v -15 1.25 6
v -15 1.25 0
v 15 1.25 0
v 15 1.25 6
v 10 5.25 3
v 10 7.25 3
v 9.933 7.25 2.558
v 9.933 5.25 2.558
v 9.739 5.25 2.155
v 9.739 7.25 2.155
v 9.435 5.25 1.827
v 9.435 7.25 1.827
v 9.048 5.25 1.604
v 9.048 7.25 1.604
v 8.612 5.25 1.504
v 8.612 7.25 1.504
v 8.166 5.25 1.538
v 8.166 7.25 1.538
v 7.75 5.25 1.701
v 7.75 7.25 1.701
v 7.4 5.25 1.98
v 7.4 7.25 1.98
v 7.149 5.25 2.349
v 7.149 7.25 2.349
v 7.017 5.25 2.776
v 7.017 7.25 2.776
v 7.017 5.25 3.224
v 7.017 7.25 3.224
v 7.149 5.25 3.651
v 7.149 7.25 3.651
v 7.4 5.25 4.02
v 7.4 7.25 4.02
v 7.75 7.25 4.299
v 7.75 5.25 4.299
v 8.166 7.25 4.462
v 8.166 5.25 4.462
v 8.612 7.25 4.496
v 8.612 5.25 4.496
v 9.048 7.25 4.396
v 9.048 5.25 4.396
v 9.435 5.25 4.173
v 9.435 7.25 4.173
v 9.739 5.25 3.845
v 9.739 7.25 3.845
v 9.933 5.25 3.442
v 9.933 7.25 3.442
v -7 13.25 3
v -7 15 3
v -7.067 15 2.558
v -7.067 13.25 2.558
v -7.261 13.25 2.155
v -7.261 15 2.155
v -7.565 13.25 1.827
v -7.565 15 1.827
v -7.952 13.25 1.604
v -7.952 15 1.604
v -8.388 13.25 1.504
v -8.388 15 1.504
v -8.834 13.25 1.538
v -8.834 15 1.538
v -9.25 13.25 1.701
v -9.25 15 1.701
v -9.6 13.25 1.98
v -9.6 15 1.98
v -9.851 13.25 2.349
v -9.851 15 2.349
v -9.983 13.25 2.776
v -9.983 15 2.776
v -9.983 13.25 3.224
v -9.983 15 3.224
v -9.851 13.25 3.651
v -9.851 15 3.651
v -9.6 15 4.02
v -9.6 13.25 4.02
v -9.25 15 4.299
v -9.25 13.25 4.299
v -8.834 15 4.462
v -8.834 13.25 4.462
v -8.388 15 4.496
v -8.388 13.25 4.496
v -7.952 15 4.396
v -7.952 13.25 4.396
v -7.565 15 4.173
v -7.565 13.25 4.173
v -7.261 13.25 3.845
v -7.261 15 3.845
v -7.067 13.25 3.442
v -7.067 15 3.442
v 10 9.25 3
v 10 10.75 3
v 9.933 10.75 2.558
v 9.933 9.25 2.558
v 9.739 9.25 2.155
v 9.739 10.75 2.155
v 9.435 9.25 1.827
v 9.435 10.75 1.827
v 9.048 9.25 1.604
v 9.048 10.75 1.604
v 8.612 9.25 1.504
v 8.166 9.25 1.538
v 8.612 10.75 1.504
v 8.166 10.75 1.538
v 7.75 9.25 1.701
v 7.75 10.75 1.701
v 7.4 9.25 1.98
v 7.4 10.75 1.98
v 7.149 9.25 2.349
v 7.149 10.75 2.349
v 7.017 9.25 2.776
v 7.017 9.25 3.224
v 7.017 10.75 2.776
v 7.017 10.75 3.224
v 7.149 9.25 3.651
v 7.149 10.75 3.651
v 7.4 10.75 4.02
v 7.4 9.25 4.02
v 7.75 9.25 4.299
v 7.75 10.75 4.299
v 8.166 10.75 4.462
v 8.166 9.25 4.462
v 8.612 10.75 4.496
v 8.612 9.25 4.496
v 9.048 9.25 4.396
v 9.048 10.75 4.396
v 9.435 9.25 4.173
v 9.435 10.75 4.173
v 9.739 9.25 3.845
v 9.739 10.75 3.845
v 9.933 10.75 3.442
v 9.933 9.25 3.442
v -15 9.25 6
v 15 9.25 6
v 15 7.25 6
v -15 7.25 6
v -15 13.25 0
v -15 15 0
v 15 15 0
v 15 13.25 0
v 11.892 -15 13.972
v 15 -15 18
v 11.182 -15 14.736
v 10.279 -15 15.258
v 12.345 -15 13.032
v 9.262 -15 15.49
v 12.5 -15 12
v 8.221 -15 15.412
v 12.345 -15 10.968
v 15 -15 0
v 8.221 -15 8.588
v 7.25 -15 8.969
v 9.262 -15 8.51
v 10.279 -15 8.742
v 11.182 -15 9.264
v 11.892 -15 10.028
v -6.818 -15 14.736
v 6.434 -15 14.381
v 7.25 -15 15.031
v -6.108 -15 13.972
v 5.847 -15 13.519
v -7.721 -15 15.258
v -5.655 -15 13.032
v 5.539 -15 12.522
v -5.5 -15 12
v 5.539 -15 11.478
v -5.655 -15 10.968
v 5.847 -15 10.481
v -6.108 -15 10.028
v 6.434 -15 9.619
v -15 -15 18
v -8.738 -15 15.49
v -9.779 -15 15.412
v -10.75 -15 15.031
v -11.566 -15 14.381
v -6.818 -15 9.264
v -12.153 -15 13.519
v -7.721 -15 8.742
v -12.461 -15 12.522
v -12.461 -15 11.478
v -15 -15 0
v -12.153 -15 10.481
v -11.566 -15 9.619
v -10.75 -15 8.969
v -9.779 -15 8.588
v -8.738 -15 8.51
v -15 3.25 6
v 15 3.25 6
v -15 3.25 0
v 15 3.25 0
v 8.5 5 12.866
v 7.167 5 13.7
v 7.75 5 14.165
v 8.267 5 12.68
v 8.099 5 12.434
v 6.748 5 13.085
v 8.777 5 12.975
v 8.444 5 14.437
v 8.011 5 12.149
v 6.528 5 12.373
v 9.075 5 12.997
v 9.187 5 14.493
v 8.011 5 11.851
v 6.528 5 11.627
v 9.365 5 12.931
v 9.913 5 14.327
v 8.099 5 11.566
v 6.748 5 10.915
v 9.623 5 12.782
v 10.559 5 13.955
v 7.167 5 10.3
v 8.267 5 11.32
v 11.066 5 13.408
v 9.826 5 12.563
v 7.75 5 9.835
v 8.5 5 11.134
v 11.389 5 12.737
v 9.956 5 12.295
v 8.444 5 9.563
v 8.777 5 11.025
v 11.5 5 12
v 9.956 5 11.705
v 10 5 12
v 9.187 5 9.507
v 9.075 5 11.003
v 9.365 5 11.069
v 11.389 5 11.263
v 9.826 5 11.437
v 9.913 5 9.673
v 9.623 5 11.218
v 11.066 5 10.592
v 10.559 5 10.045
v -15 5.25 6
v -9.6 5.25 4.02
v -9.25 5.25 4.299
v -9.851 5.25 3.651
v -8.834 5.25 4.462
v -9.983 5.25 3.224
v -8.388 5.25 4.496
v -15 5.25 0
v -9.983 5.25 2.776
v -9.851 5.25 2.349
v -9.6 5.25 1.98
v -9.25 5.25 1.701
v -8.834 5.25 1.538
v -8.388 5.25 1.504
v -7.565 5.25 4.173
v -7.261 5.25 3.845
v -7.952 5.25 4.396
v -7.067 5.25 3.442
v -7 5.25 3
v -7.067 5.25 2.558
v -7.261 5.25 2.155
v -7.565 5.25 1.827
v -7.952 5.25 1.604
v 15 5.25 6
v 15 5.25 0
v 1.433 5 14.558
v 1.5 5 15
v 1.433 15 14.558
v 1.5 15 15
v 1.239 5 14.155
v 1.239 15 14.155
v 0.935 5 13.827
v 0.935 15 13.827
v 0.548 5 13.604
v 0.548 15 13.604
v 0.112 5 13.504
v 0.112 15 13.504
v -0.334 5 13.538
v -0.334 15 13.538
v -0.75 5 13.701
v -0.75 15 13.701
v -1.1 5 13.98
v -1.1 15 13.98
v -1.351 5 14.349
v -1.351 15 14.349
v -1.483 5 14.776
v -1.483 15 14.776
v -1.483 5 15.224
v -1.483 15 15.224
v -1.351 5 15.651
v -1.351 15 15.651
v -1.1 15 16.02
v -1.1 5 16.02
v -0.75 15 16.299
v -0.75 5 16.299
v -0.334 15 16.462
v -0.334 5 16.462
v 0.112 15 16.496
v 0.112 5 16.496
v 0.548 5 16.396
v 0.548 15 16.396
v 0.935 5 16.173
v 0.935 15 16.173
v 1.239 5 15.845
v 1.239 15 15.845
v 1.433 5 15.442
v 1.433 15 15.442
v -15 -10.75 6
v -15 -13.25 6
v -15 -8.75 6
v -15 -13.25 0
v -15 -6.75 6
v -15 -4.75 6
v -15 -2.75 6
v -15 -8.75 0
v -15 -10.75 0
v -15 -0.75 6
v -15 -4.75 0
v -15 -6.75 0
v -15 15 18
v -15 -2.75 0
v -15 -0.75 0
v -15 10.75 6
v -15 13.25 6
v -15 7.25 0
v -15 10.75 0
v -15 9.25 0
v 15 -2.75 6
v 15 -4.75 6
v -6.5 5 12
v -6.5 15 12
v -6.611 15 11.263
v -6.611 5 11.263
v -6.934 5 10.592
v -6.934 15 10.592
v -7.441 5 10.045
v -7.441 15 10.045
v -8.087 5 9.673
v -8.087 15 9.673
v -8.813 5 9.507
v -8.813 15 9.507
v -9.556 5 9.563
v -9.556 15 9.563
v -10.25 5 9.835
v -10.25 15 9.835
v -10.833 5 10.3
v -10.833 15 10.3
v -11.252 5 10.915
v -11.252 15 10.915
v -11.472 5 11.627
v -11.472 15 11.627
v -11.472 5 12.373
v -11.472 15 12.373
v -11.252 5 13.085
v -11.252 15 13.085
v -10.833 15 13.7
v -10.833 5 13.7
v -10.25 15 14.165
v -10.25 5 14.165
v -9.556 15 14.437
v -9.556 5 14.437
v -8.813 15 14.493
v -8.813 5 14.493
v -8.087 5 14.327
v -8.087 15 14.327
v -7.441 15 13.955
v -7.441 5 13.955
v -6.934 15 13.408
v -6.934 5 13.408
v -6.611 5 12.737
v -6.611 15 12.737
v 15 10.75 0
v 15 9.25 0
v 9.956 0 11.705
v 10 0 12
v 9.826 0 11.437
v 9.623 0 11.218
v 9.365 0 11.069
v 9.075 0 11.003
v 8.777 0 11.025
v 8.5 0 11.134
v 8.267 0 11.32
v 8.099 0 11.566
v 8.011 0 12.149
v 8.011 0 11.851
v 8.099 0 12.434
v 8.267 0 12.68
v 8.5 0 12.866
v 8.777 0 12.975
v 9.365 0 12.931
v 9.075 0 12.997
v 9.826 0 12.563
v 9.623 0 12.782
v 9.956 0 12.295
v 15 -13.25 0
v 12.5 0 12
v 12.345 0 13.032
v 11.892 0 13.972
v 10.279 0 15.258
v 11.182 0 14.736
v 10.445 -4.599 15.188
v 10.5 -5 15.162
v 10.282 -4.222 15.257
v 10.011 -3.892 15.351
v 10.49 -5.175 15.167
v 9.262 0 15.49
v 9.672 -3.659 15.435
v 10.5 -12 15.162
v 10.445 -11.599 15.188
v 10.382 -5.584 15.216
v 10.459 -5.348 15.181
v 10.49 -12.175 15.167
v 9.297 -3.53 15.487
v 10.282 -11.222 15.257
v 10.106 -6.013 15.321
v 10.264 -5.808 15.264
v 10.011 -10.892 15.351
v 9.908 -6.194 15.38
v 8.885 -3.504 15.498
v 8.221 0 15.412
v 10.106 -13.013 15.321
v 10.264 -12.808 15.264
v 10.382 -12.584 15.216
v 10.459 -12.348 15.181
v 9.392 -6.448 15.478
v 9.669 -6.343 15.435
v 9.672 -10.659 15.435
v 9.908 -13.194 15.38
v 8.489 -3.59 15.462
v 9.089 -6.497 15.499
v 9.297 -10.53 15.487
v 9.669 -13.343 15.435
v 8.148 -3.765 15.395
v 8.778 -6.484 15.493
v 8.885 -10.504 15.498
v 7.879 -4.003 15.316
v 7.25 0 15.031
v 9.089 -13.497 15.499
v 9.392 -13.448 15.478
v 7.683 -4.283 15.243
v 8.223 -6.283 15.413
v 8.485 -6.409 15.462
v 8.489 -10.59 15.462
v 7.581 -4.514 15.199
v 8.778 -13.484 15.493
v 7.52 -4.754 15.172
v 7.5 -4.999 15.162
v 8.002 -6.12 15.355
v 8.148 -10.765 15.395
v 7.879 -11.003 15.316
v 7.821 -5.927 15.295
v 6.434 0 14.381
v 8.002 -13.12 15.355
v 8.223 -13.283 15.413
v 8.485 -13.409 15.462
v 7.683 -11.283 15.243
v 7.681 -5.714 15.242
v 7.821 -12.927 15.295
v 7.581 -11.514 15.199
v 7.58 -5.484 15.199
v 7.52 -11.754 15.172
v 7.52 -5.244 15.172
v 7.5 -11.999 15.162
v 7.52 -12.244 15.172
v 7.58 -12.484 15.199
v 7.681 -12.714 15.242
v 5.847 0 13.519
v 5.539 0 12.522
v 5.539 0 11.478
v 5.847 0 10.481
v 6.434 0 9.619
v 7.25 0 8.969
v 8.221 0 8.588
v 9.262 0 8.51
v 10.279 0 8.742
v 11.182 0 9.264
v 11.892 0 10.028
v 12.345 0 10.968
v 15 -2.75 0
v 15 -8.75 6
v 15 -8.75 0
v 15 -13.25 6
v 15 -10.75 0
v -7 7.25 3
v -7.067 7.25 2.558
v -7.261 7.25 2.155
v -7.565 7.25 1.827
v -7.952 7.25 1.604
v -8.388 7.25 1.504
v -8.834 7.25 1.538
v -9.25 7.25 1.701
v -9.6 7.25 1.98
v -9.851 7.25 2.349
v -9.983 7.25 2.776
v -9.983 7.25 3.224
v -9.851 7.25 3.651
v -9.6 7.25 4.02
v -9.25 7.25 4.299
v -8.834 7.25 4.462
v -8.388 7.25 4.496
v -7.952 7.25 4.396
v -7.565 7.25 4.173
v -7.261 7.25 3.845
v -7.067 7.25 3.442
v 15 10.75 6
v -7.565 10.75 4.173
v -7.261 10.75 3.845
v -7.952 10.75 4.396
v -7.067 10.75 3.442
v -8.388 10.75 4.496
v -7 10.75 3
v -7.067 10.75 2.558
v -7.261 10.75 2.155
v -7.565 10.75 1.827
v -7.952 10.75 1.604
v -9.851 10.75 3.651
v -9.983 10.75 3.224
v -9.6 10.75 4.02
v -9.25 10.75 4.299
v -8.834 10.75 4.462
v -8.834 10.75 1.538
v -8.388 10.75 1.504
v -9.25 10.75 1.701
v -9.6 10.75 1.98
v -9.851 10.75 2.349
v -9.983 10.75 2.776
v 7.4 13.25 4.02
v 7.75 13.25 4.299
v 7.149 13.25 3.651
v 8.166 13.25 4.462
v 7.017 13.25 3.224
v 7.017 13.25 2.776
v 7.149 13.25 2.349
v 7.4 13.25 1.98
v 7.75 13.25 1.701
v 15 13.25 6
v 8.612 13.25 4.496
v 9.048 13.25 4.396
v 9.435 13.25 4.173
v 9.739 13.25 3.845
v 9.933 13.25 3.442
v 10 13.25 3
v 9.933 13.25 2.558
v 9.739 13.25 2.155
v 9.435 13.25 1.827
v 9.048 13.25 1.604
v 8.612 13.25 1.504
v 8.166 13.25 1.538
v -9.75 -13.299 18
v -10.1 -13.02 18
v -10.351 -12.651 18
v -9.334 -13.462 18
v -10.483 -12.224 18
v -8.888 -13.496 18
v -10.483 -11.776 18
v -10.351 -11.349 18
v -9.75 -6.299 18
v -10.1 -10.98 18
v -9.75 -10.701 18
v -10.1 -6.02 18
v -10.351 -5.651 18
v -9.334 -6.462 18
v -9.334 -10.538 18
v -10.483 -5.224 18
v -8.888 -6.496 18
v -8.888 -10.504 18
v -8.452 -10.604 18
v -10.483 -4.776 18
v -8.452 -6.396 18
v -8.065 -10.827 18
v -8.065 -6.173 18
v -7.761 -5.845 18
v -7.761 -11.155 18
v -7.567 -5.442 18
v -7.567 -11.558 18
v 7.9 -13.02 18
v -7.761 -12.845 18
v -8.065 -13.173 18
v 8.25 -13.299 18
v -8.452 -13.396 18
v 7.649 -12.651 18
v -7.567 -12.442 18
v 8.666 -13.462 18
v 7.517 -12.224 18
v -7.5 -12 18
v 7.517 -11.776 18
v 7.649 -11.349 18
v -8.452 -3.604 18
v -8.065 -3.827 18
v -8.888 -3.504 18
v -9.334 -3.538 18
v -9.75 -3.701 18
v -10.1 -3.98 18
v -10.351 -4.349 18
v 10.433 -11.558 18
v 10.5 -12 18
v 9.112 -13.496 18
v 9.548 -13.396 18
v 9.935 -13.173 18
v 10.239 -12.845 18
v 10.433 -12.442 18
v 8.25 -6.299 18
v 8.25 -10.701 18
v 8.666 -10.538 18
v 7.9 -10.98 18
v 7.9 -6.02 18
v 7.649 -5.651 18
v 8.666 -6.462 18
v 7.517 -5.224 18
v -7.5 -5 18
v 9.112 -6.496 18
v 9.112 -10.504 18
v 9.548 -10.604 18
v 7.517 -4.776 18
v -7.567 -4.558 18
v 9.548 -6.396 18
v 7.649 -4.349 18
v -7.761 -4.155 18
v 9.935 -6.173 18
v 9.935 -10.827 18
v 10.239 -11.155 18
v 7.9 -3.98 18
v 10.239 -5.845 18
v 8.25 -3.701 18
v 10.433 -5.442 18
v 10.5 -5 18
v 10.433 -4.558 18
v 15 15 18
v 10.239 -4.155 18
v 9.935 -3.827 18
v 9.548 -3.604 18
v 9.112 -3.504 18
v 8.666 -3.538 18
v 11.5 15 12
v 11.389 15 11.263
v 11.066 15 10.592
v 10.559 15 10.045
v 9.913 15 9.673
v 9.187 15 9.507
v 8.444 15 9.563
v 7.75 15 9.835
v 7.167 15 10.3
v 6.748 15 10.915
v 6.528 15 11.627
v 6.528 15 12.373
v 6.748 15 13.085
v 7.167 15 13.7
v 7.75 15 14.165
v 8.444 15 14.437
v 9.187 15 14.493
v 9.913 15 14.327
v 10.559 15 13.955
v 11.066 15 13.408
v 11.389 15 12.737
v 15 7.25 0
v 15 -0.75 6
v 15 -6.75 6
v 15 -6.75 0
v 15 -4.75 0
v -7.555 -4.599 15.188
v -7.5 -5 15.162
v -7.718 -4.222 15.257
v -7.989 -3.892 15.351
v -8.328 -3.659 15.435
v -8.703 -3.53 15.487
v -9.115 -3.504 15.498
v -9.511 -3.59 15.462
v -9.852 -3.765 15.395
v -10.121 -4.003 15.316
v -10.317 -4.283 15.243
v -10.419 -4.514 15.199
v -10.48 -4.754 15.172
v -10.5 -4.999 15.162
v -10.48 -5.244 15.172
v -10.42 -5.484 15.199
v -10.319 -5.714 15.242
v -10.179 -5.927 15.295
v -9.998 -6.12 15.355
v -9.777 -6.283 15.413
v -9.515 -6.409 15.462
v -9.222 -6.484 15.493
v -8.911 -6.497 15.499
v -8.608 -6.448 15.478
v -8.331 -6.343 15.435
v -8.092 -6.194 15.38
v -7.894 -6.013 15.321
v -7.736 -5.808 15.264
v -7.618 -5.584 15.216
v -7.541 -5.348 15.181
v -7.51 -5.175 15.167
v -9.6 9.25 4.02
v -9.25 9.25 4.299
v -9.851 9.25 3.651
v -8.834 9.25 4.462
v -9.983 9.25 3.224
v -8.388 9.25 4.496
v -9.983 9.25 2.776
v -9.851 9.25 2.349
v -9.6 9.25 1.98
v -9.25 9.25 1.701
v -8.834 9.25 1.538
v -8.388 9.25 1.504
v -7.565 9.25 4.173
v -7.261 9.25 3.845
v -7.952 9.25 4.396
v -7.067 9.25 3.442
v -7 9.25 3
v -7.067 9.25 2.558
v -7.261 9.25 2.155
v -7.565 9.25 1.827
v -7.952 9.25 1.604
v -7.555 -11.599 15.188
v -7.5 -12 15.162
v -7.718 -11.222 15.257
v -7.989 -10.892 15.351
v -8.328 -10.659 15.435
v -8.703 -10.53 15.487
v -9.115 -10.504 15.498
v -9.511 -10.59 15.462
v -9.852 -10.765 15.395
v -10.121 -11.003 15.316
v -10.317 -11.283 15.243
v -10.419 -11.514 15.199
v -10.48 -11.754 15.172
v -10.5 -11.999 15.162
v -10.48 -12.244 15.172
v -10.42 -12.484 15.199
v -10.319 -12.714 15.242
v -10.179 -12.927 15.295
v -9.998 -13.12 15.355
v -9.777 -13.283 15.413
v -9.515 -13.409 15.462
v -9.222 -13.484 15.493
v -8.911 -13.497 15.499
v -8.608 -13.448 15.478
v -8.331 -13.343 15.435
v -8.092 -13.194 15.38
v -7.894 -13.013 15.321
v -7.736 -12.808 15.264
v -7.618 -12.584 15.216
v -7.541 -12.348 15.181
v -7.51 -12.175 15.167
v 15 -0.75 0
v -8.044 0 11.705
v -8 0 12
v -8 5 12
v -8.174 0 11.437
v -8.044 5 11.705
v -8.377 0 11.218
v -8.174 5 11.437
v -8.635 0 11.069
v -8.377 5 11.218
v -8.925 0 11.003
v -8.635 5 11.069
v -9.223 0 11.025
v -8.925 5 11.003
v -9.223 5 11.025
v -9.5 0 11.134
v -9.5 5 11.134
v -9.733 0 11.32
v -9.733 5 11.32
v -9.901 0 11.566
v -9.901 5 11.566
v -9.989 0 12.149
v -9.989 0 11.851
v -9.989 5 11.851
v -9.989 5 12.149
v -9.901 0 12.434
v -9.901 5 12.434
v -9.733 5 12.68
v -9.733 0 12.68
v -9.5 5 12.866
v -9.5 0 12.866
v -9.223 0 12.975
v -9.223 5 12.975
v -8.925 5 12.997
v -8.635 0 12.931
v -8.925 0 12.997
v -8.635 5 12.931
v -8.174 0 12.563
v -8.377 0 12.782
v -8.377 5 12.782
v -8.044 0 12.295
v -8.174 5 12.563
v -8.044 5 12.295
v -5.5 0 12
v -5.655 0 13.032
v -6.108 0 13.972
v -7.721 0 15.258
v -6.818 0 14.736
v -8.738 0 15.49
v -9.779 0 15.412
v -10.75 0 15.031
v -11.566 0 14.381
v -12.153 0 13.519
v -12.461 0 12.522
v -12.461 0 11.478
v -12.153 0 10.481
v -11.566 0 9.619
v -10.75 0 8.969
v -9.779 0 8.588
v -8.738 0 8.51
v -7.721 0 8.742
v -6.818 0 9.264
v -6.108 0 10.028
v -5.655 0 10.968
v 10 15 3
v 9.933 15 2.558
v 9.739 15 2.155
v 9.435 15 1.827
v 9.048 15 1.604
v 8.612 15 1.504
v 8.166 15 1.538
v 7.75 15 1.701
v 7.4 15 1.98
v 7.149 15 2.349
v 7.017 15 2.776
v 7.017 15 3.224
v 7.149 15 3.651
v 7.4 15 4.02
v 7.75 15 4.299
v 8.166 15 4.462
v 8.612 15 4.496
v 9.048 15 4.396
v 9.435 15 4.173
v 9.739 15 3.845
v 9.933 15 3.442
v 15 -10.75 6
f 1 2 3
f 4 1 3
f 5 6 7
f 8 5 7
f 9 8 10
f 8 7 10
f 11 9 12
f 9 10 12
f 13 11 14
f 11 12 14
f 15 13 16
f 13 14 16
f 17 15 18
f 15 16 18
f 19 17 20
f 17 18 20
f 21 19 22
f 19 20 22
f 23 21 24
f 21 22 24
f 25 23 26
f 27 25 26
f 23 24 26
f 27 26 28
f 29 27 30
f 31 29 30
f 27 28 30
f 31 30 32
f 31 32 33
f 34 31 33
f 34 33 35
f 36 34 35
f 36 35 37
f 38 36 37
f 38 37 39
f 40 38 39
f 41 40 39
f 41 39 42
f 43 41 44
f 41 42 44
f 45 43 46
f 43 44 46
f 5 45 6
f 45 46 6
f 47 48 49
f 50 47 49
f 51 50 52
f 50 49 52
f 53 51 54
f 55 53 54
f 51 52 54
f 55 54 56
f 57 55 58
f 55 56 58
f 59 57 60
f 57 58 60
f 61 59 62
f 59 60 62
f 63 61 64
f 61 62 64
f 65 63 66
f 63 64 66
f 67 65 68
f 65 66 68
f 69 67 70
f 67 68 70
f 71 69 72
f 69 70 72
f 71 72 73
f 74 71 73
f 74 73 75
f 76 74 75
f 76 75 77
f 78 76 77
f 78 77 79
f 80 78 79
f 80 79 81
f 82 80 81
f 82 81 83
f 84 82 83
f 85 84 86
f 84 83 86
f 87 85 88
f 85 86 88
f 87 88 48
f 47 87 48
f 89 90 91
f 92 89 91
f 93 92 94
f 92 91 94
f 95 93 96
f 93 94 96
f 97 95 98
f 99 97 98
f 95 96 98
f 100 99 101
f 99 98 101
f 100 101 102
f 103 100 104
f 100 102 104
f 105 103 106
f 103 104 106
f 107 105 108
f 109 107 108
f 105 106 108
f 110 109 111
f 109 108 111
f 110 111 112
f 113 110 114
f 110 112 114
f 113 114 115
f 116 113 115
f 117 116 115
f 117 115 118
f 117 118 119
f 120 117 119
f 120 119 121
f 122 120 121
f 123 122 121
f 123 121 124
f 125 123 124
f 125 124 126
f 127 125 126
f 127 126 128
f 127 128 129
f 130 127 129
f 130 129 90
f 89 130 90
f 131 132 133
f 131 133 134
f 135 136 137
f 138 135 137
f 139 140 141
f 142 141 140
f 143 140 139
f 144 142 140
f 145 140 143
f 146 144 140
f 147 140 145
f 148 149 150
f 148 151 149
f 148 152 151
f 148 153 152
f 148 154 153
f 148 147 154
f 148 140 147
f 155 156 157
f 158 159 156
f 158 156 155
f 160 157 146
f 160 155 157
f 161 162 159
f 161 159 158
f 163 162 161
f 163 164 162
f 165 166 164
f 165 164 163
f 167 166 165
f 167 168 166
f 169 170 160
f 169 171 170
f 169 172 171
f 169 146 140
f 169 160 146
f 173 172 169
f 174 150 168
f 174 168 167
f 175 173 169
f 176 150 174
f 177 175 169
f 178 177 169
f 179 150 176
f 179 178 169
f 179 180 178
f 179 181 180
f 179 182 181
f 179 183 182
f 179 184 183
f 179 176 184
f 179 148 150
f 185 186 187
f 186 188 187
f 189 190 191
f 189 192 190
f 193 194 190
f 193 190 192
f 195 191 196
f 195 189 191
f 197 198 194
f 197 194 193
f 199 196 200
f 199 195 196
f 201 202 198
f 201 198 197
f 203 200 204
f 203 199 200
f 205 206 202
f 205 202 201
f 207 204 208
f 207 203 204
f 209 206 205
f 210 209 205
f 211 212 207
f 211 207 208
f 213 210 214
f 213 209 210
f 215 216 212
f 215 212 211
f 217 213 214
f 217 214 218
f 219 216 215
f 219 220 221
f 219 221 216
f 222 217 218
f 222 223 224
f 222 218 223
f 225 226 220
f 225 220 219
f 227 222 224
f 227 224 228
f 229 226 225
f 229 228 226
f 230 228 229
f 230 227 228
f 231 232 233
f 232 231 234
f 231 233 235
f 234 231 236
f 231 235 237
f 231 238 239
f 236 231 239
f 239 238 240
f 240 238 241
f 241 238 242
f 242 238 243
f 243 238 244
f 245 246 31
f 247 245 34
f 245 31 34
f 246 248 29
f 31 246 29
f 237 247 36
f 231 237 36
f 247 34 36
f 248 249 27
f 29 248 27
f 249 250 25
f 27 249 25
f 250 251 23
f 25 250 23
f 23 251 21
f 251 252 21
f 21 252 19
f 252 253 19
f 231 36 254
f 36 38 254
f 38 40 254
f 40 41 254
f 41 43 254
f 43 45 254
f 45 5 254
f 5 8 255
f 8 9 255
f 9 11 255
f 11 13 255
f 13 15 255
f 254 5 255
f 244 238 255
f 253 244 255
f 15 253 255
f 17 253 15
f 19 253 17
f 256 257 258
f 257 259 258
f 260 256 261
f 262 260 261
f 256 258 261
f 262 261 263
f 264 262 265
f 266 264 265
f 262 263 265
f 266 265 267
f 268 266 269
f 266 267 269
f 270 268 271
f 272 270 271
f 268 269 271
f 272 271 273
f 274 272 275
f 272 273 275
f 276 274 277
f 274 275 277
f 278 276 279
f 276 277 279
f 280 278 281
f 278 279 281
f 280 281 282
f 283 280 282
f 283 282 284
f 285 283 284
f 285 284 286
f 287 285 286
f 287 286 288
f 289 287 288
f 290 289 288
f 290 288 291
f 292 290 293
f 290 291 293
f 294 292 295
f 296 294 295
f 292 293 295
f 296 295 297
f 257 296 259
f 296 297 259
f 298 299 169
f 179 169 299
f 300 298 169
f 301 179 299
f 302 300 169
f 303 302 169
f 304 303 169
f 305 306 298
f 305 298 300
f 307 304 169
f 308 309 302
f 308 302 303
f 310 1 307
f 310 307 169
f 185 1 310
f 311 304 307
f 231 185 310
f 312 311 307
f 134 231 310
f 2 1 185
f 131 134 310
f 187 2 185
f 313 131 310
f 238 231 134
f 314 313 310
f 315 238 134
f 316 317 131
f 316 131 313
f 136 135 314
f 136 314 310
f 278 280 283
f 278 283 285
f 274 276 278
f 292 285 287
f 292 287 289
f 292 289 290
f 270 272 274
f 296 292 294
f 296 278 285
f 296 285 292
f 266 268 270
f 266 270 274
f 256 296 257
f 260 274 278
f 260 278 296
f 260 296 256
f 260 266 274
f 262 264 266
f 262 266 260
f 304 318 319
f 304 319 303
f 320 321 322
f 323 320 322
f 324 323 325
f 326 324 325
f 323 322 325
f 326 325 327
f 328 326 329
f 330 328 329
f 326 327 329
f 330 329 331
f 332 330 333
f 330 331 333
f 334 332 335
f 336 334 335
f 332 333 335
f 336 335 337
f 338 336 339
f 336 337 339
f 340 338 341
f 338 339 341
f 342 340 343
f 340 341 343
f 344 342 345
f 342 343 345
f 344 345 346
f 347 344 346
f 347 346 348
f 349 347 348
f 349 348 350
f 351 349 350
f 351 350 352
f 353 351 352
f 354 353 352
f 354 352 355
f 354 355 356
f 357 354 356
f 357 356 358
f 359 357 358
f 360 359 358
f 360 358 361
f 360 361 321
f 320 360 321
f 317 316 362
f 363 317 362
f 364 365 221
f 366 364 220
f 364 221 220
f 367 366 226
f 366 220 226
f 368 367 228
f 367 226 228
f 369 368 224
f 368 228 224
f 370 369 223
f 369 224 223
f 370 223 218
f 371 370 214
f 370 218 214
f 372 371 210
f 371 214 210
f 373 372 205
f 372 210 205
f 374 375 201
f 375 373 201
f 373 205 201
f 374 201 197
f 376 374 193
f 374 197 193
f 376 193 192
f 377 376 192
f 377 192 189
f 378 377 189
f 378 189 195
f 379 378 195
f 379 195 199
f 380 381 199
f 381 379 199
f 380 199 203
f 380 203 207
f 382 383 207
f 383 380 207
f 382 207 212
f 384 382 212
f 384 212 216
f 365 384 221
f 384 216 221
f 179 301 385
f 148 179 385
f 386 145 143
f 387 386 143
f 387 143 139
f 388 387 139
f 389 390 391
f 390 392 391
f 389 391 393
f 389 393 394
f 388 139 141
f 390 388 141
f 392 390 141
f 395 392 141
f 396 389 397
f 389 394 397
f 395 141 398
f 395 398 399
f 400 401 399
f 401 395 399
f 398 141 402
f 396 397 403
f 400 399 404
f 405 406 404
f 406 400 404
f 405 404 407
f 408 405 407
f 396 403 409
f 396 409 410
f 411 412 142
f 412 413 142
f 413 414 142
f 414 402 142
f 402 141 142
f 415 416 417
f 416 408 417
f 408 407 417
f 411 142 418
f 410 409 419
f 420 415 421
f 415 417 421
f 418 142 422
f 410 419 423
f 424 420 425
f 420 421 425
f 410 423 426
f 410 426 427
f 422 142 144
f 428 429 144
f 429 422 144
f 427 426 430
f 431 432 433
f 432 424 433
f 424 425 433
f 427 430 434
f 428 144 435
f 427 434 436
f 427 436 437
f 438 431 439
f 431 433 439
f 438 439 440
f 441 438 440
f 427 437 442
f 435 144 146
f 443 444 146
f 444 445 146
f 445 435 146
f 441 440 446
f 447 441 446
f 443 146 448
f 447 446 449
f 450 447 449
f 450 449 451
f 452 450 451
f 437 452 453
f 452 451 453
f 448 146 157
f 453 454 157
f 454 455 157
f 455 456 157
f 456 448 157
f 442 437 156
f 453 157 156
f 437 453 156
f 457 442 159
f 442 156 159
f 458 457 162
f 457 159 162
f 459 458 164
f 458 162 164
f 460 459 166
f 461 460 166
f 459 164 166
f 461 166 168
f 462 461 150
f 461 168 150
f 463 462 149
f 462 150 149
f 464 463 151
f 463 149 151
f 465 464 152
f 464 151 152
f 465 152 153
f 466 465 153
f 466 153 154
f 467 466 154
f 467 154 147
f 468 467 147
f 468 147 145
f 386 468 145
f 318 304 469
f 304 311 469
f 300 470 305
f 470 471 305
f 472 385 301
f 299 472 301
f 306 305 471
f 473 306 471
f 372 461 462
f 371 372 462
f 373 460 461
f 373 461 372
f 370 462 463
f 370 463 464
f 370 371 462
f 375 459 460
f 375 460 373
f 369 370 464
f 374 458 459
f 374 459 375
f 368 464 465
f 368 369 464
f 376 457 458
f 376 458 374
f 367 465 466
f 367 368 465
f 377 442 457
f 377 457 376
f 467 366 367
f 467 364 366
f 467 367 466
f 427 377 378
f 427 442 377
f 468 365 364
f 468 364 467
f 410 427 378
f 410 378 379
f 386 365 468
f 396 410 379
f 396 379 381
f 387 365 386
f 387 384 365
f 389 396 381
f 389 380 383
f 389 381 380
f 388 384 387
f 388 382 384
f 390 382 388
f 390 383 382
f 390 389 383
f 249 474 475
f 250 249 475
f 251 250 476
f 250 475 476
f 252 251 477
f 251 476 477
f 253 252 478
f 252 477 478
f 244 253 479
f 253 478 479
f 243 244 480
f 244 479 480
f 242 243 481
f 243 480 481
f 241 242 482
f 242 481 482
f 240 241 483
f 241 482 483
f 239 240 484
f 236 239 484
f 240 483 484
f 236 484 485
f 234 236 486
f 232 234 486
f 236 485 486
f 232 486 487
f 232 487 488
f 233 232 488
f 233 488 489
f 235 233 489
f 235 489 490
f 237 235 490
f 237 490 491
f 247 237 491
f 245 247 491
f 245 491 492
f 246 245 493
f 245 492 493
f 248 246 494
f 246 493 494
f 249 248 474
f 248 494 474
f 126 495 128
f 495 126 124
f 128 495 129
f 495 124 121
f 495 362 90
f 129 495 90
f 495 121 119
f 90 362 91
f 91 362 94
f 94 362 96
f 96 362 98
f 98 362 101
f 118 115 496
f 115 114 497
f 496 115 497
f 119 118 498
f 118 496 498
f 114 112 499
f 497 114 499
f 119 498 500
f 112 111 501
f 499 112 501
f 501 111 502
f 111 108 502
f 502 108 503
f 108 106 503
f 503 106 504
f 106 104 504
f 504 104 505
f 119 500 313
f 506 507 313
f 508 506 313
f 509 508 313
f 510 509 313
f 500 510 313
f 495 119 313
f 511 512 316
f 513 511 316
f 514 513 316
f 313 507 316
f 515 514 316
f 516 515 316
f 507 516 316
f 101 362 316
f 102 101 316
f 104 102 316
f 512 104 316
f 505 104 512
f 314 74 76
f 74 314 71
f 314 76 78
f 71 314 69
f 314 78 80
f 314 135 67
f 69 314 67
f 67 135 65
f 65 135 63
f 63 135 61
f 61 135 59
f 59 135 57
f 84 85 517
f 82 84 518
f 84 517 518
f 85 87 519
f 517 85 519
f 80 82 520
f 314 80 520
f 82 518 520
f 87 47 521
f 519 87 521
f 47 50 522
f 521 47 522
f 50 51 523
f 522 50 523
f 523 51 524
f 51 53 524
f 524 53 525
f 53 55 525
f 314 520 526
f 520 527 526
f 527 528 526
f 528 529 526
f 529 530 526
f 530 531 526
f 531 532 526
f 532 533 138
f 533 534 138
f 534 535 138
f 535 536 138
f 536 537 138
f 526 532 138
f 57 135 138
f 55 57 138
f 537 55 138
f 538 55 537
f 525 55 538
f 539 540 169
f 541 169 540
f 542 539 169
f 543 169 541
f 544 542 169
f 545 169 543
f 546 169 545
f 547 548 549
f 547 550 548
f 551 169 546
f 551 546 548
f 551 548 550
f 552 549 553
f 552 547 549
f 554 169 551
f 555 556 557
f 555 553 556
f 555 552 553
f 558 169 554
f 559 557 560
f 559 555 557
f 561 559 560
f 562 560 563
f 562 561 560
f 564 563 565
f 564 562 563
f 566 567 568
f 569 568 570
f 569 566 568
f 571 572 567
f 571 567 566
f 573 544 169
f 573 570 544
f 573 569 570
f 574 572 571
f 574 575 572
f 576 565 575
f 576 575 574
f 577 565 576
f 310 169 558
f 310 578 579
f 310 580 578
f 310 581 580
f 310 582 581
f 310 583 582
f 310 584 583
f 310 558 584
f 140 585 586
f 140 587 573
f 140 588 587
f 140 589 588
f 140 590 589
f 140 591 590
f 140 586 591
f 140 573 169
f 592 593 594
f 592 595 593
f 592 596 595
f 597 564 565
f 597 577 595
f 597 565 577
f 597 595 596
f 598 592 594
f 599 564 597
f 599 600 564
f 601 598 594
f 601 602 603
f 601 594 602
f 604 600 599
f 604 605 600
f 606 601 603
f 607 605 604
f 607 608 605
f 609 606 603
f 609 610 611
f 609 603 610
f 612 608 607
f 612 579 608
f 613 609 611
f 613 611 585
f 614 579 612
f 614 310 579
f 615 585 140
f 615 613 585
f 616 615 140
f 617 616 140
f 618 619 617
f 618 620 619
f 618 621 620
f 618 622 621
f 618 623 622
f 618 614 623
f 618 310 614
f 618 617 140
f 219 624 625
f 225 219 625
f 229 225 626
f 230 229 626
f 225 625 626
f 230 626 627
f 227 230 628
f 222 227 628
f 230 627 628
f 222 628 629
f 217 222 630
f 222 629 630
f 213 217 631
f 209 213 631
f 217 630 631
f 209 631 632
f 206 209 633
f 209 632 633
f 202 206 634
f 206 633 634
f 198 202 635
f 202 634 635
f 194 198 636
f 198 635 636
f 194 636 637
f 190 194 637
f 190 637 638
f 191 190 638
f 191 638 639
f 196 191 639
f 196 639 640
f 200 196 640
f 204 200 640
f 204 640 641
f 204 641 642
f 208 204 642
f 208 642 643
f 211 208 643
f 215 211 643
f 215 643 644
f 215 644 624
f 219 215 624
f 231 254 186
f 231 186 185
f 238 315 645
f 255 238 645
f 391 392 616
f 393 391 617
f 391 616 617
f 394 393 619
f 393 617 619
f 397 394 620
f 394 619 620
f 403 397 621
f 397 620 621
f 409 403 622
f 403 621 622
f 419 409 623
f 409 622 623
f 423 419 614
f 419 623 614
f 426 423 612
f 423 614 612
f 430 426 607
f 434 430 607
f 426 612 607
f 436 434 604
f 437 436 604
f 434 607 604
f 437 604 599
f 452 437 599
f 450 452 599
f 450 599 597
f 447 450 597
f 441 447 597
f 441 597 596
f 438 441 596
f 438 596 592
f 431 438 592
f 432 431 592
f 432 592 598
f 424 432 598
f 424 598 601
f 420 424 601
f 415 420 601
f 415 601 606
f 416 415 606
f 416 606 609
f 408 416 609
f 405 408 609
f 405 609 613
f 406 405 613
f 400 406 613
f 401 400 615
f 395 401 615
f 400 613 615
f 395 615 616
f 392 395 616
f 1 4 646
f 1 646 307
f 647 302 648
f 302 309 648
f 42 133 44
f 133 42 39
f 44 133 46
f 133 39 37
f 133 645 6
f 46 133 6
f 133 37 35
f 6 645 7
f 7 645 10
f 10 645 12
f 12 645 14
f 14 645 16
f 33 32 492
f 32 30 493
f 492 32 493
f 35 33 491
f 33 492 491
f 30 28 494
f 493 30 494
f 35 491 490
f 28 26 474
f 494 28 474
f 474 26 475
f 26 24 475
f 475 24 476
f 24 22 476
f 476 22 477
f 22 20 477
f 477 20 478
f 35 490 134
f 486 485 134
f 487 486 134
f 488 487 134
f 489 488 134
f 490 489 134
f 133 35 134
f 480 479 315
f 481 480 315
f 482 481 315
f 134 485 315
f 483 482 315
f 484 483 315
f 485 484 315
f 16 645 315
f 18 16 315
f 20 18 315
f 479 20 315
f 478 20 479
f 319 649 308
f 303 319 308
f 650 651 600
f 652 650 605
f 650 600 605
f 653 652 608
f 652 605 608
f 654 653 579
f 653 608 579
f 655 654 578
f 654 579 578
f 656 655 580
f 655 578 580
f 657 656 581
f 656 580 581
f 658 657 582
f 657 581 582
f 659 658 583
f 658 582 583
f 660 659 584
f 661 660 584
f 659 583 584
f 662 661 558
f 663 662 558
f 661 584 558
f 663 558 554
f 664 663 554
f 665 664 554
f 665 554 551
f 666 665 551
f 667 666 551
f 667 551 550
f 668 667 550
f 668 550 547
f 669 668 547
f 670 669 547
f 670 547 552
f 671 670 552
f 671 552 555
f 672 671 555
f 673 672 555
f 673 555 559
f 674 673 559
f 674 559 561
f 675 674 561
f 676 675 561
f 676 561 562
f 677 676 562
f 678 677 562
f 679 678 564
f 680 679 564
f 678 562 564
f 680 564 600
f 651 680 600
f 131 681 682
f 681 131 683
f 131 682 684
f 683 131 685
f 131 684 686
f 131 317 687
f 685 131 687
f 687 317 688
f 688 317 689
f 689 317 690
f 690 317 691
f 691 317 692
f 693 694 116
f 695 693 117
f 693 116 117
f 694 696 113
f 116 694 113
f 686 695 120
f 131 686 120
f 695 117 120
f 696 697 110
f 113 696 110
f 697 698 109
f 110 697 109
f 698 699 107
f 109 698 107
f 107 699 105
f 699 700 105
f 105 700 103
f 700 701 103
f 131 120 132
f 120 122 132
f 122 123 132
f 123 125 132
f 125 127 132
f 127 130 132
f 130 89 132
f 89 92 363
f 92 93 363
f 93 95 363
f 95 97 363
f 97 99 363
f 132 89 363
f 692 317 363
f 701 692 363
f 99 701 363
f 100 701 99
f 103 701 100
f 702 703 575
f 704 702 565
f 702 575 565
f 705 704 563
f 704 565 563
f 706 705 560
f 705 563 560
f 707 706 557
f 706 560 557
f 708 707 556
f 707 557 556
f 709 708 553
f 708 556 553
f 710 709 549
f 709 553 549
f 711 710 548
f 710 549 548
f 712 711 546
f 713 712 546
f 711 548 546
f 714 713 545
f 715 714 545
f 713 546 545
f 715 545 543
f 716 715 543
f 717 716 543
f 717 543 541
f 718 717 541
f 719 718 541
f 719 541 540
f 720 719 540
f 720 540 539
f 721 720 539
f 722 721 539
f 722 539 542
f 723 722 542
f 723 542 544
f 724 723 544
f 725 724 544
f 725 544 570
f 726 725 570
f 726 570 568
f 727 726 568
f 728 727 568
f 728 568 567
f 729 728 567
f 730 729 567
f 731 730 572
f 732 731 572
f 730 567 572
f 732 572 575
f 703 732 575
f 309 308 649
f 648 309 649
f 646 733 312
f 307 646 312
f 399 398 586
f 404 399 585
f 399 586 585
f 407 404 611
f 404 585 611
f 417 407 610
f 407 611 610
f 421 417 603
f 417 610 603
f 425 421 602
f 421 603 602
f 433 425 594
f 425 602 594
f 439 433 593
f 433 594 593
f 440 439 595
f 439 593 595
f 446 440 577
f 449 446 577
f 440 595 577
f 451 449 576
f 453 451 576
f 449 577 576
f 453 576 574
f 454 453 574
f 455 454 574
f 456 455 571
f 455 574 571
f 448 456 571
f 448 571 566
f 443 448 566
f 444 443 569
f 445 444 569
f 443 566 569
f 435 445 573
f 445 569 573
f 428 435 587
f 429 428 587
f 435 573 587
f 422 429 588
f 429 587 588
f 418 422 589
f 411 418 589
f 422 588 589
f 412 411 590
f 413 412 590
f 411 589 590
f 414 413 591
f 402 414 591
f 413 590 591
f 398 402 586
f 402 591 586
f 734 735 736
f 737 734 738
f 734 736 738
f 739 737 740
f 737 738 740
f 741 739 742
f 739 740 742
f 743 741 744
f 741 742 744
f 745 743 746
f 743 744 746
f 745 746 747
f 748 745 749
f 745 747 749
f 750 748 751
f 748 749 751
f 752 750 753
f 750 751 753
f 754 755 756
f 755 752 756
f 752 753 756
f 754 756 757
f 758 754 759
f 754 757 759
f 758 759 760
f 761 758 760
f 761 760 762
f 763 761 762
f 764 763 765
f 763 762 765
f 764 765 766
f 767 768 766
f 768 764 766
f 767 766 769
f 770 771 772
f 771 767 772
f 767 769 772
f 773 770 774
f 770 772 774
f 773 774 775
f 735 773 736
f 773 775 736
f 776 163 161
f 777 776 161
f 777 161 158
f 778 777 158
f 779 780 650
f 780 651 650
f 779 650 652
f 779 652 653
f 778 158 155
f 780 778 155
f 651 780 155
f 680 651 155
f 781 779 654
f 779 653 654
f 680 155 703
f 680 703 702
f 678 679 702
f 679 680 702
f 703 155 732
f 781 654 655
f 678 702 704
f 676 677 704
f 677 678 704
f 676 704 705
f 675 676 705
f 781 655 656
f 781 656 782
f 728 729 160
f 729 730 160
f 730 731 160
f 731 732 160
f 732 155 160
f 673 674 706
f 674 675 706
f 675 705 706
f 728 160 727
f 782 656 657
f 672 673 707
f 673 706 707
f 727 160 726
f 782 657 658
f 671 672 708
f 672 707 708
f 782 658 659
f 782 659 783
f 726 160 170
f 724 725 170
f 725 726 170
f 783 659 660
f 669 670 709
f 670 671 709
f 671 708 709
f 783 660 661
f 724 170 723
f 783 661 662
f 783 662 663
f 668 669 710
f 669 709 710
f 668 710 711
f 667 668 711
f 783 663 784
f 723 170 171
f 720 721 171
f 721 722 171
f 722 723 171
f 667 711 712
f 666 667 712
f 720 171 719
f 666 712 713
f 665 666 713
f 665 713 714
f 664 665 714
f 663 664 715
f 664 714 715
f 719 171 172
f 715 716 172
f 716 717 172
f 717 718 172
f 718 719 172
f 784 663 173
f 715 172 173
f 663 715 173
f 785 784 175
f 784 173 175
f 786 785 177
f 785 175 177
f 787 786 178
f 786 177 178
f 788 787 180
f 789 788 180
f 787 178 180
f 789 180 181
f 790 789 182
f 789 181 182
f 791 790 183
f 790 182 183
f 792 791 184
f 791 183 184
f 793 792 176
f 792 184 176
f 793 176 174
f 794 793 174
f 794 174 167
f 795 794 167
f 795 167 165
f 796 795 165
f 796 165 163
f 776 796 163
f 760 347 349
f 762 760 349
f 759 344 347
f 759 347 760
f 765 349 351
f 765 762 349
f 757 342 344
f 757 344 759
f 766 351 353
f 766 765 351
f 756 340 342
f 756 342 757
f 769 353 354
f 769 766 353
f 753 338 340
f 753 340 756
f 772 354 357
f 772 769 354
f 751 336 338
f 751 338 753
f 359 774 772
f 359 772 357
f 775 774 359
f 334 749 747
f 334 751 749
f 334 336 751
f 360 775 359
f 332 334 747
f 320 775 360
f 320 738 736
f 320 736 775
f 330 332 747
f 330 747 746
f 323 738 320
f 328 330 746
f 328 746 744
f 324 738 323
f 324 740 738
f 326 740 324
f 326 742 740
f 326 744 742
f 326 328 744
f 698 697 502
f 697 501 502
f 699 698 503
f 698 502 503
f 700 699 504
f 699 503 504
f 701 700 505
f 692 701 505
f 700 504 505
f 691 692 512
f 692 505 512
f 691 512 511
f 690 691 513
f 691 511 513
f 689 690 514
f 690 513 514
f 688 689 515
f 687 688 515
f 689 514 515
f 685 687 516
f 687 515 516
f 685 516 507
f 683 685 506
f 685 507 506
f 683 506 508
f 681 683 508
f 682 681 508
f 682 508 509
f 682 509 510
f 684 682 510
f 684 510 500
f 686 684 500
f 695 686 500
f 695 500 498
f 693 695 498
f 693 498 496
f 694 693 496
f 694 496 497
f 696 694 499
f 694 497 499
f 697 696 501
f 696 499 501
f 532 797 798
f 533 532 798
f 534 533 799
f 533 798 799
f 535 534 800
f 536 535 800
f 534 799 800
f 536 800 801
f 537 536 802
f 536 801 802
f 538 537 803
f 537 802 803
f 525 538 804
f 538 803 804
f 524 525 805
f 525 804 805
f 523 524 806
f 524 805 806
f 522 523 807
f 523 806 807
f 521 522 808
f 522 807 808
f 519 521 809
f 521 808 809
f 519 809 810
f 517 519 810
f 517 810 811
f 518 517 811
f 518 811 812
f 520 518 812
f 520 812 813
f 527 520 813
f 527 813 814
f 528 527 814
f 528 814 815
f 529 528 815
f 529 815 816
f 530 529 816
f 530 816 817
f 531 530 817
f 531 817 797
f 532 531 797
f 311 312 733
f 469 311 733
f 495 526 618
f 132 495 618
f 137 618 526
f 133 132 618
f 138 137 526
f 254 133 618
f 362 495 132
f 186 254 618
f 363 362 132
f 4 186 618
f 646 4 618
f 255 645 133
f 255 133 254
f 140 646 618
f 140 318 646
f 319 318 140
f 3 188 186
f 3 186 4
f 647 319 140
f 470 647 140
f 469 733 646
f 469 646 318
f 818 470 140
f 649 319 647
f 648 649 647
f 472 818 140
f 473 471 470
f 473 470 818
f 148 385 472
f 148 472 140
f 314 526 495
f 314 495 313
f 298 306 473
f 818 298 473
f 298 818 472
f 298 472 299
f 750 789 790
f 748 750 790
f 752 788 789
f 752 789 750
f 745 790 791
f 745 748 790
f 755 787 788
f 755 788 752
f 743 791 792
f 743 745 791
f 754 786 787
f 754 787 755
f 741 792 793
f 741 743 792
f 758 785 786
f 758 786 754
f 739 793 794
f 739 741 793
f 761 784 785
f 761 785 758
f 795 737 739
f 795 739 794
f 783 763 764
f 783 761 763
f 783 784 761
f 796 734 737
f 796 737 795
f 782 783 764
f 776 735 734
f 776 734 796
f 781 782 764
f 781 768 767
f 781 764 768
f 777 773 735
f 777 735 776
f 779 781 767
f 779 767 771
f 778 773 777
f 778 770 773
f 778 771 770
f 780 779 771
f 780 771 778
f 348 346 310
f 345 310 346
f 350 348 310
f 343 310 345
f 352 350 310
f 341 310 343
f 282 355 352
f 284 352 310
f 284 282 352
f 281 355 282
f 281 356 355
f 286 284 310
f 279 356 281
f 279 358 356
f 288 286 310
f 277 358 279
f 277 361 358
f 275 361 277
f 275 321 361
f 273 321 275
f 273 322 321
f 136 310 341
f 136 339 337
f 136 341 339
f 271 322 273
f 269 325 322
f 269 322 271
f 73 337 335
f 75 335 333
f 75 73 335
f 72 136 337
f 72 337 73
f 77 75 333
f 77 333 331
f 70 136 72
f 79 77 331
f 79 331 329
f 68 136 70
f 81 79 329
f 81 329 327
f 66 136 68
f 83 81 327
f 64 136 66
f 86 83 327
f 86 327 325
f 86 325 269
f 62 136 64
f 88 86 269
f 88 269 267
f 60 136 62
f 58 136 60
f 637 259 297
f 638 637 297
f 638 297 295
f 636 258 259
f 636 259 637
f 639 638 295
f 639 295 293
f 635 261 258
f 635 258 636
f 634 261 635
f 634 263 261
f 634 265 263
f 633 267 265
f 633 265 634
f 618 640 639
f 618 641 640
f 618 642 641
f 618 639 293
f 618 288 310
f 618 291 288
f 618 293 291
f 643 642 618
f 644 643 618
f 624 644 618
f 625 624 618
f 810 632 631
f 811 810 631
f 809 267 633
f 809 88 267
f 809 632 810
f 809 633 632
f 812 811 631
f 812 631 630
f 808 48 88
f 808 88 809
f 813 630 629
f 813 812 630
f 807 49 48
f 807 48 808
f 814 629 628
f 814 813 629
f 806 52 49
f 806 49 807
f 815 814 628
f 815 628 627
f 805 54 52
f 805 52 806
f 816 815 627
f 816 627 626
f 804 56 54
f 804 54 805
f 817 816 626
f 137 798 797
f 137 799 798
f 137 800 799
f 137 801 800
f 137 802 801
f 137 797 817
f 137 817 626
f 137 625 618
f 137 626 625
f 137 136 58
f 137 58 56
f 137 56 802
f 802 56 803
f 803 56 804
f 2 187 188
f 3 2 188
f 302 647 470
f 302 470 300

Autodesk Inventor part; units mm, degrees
ref_plane "YZ Plane" through (0, 0, 0) normal (1, 0, 0) x (0, 1, 0)
ref_plane "XZ Plane" through (0, 0, 0) normal (0, 1, 0) x (-1, 0, 0)
ref_plane "XY Plane" through (0, 0, 0) normal (0, 0, 1) x (1, 0, 0)
sketch "Sketch1" plane through (0, 0, 0) normal (0, 0, 1) x (1, 0, 0)
  line L0 (-15, 15) -> (15, 15)
  line L1 (15, 15) -> (15, -15)
  line L2 (15, -15) -> (-15, -15)
  line L3 (-15, -15) -> (-15, 15)
  point P0 (0, 0)
  dimension "d0" = 30
  dimension "d1" = 30
  dimension "d2" = 15
  dimension "d3" = 15
extrude "Extrusion1" add sketch "Sketch1" along normal blind 18
sketch "Sketch2" plane through (-15, 15, 0) normal (0, 1, 0) x (1, 0, 0)
  circle A0 centre (6.5, -3) radius 1.5
  circle A1 centre (23.5, -3) radius 1.5
  circle A2 centre (15, -15) radius 1.5
  circle A3 centre (6, -12) radius 2.5
  circle A4 centre (24, -12) radius 2.5
  line L0 (0, 0) -> (30, 0) projected
  line L1 (15, 0) -> (15, -28.1045) construction
  line L2 (30, -18) -> (0, -18) construction
  line L3 (6, -12) -> (24, -12) construction
  dimension "d6" = 3
  dimension "d7" = 3
  dimension "d8" = 3
  dimension "d9" = 5
  dimension "d10" = 5
  dimension "d11" = 17
  dimension "d12" = 3
  dimension "d13" = 3
  dimension "d14" = 8.5
  dimension "d15" = 18
  dimension "d16" = 9
  dimension "d17" = 3
  dimension "d18" = 6
  dimension "d19" = 6
  dimension "d20" = 0
  dimension "d51" = 3
  dimension "d52" = 9
extrude "Extrusion2" cut sketch "Sketch2" against normal blind 10
thread "Thread3" size "M3x0.5" class "6H" standard "ANSI Metric M Profile" full length
thread "Thread4" size "M3x0.5" class "6H" standard "ANSI Metric M Profile" full length
thread "Thread5" size "M3x0.5" class "6H" standard "ANSI Metric M Profile" full length
sketch "Sketch3" plane through (-9, 5, 12) normal (0, 1, 0) x (1, 0, 0)
  circle A0 centre (0, 0) radius 1
  point P0 (9, 12)
  dimension "d23" = 2
extrude "Extrusion3" cut sketch "Sketch3" against normal through all
sketch "Sketch4" plane through (9, 5, 12) normal (0, 1, 0) x (1, 0, 0)
  circle A0 centre (0, 0) radius 1
  point P0 (-9, 12)
  dimension "d26" = 2
extrude "Extrusion4" cut sketch "Sketch4" against normal through all
sketch "Sketch5" plane through (-15, -15, 0) normal (0, -1, 0) x (1, 0, 0)
  circle A0 centre (6, 12) radius 1 projected
  circle A1 centre (6, 12) radius 3.5
  circle A2 centre (24, 12) radius 1 projected
  circle A3 centre (24, 12) radius 3.5
  point P0 (15, 0)
  dimension "d29" = 7
  dimension "d30" = 7
extrude "Extrusion5" cut sketch "Sketch5" against normal blind 15
sketch "Sketch6" plane through (0, 0, 0) normal (0, 0, -1) x (-1, 0, 0)
  line L0 (15, 15) -> (15, -15) projected
  line L1 (-15, -13.25) -> (15, -13.25)
  line L2 (15, -13.25) -> (15, -10.75)
  line L3 (15, -10.75) -> (-15, -10.75)
  line L4 (-15, -10.75) -> (-15, -13.25)
  line L5 (-15, -15) -> (15, -15) projected
  line L6 (-15, 10.75) -> (15, 10.75)
  line L7 (15, 10.75) -> (15, 13.25)
  line L8 (15, 13.25) -> (-15, 13.25)
  line L9 (-15, 13.25) -> (-15, 10.75)
  line L10 (15, 15) -> (-15, 15) projected
  line L11 (-15, -8.75) -> (15, -8.75)
  line L12 (15, -8.75) -> (15, -6.75)
  line L13 (15, -6.75) -> (-15, -6.75)
  line L14 (-15, -6.75) -> (-15, -8.75)
  line L15 (15, -2.75) -> (-15, -2.75)
  line L16 (-15, -2.75) -> (-15, -4.75)
  line L17 (-15, -4.75) -> (15, -4.75)
  line L18 (15, -4.75) -> (15, -2.75)
  line L19 (15, 1.25) -> (-15, 1.25)
  line L20 (-15, 1.25) -> (-15, -0.75)
  line L21 (-15, -0.75) -> (15, -0.75)
  line L22 (15, -0.75) -> (15, 1.25)
  line L23 (15, 5.25) -> (-15, 5.25)
  line L24 (-15, 5.25) -> (-15, 3.25)
  line L25 (-15, 3.25) -> (15, 3.25)
  line L26 (15, 3.25) -> (15, 5.25)
  line L27 (15, 9.25) -> (-15, 9.25)
  line L28 (-15, 9.25) -> (-15, 7.25)
  line L29 (-15, 7.25) -> (15, 7.25)
  line L30 (15, 7.25) -> (15, 9.25)
  point P0 (0, 0)
  dimension "d33" = 30
  dimension "d34" = 30
  dimension "d35" = 2.5
  dimension "d36" = 1.75
  dimension "d37" = 2.5
  dimension "d38" = 30
  dimension "d39" = 1.75
  dimension "d40" = 2
  dimension "d41" = 2
  dimension "d44" = 4
extrude "Extrusion6" cut sketch "Sketch6" against normal blind 6
thread "Thread1" size "M5x0.8" class "6H" standard "ANSI Metric M Profile" full length
thread "Thread2" size "M5x0.8" class "6H" standard "ANSI Metric M Profile" full length
sketch "Sketch7" plane through (0, 0, 18) normal (0, 0, 1) x (1, 0, 0)
  circle A0 centre (-9, -12) radius 1.5
  circle A1 centre (9, -12) radius 1.5
  circle A2 centre (9, -5) radius 1.5
  circle A3 centre (-9, -5) radius 1.5
  line L0 (-5.5, -15) -> (-12.5, -15) projected
  line L1 (-15, -15) -> (15, -15) projected
  point P0 (0, 0)
  dimension "d63" = 3
  dimension "d64" = 3
  dimension "d65" = 3
  dimension "d66" = 3
  dimension "d67" = 18
  dimension "d68" = 18
  dimension "d69" = 9
  dimension "d70" = 9
  dimension "d71" = 3
  dimension "d72" = 3
  dimension "d73" = 7
  dimension "d74" = 7
extrude "Extrusion7" cut sketch "Sketch7" against normal up to next
thread "Thread6" size "M3x0.5" class "6H" standard "ANSI Metric M Profile" full length
thread "Thread7" size "M3x0.5" class "6H" standard "ANSI Metric M Profile" full length
thread "Thread8" size "M3x0.5" class "6H" standard "ANSI Metric M Profile" full length
thread "Thread9" size "M3x0.5" class "6H" standard "ANSI Metric M Profile" full length
equation "\"d2\" = 0.5 * d1"
equation "\"d3\" = 0.5 * d0"
equation "\"d13\" = d12"
equation "\"d14\" = 0.5 * d11"
equation "\"d16\" = 0.5 * d15"
equation "\"d19\" = d18"
equation "\"d34\" = d33"
equation "\"d37\" = d35"
equation "\"d38\" = d33"
equation "\"d39\" = d36"
equation "\"d41\" = d40"
equation "\"d68\" = d67"
equation "\"d69\" = 0.5 * d67"
equation "\"d70\" = d69"
equation "\"d74\" = d73"
properties part number "nozzel heat sink"
